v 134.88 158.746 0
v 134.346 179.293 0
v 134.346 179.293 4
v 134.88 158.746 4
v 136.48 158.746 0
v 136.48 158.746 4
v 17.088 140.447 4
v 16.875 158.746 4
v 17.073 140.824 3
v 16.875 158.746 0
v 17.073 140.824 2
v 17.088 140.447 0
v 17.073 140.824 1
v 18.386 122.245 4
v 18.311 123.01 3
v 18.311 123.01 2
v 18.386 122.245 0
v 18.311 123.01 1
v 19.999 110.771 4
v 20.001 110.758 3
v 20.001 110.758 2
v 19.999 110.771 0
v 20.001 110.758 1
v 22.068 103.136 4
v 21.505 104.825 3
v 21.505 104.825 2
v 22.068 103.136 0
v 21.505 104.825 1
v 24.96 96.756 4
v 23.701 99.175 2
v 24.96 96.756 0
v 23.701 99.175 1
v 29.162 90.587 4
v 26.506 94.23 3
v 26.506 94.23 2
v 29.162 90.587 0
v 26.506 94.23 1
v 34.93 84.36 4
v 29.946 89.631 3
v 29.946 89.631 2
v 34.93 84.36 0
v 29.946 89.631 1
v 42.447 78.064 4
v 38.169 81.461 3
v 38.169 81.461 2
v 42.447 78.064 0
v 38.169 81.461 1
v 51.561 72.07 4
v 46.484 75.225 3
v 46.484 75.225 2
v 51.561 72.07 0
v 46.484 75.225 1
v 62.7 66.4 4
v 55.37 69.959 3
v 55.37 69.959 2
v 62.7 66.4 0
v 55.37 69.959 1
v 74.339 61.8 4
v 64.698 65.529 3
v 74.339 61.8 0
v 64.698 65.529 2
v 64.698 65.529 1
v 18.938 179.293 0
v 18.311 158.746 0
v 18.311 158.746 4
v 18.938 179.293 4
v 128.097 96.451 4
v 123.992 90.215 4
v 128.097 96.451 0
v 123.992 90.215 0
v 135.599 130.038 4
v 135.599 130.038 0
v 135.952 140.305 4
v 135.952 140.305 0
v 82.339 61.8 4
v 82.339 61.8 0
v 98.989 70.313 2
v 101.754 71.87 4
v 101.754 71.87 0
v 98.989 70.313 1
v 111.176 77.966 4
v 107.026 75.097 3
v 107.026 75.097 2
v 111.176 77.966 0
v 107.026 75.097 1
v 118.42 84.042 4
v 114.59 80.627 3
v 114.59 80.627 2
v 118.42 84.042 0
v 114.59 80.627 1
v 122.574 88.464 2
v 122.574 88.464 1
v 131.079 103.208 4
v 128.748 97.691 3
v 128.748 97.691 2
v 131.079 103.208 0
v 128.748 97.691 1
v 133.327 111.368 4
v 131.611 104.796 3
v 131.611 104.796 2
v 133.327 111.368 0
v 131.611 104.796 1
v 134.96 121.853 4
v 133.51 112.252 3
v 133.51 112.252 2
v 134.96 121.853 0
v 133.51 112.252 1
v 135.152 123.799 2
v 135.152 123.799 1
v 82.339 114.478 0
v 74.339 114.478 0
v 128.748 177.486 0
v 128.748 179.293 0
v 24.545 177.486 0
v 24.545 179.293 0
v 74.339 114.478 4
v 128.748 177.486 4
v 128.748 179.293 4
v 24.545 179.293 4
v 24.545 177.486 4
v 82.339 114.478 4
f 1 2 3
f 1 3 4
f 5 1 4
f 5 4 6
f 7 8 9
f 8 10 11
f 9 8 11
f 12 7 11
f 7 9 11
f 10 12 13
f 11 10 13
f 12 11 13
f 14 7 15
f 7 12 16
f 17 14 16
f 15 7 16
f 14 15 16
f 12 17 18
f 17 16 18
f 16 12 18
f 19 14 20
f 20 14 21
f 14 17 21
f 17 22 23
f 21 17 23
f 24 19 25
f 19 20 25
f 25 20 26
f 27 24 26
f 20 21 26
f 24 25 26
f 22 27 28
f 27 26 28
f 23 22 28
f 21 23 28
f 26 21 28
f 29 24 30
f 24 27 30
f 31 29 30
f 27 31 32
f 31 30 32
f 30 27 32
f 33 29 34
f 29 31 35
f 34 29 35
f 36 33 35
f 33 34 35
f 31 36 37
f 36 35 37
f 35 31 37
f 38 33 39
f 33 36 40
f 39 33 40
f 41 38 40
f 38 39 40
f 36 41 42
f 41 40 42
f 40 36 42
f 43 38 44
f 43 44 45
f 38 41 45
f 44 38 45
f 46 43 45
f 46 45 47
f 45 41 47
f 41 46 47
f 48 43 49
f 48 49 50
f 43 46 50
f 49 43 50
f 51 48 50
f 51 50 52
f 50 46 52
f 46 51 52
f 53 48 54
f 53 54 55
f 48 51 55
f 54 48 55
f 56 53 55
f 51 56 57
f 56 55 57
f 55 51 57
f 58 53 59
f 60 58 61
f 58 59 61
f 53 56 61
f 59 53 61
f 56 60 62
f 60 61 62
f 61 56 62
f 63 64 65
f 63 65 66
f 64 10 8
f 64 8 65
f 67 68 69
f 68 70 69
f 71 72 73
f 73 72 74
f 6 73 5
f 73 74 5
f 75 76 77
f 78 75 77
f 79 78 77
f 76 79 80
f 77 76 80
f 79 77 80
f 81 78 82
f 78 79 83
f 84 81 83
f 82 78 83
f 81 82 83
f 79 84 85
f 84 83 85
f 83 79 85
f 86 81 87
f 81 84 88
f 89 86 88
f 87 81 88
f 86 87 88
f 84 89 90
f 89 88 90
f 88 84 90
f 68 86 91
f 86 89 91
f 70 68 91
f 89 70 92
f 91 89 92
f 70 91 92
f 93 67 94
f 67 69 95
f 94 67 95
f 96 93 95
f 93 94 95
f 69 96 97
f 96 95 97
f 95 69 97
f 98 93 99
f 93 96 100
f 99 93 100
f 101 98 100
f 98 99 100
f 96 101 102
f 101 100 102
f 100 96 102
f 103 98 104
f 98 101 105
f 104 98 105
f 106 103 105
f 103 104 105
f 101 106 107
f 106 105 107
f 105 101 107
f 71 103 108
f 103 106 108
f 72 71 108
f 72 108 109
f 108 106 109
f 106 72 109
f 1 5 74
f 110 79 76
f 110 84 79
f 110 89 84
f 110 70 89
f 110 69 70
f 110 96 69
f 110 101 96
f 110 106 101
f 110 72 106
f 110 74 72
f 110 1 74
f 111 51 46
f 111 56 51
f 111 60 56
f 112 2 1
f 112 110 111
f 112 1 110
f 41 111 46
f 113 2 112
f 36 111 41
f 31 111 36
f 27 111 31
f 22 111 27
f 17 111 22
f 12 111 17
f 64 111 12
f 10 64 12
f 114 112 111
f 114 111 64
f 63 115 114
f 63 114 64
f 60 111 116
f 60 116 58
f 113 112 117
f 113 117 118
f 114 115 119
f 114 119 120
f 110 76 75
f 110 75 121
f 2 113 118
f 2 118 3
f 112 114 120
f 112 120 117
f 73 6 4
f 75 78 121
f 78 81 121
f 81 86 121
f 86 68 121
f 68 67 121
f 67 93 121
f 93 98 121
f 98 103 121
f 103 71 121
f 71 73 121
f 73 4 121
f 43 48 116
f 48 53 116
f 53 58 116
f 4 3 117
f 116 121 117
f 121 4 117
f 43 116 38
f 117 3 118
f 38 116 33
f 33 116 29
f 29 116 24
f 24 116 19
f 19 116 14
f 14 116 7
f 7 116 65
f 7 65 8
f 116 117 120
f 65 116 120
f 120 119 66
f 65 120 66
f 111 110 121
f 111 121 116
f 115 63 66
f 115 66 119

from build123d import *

# Parameters (mm, degrees)
EXTRUDE_1_DEPTH = 4


with BuildPart() as part:
    # 草图1 → 凸台-拉伸1 (new body)
    with BuildSketch(Plane.XY):
        with BuildLine():
            Line((24.544959995, 177.485969069), (128.748328158, 177.485969069))
            Line((128.748328158, 177.485969069), (128.748328158, 179.293294419))
            Line((128.748328158, 179.293294419), (134.346034298, 179.293294419))
            Line((134.346034298, 179.293294419), (134.879857933, 158.745986921))
            Line((134.879857933, 158.745986921), (136.480161375, 158.745986921))
            add(Edge.make_bspline(
                [(82.339222624, 61.799570381), (93.413791621, 67.40108472), (111.733151171, 75.721290264), (128.944446456, 95.047085793), (136.913830684, 122.368393715), (135.612959328, 143.308632698), (136.480161375, 158.745986921)],
                knots=[0, 0, 0, 0, 0.307761121, 0.49025, 0.616329843, 1, 1, 1, 1], degree=3))
            Line((82.339222624, 61.799570381), (82.339222624, 114.477905509))
            Line((82.339222624, 114.477905509), (74.339356348, 114.477905509))
            Line((74.339356348, 114.477905509), (74.339356348, 61.799570381))
            add(Edge.make_bspline(
                [(16.87547225, 158.745986921), (16.656848614, 146.616830277), (17.473837396, 127.05807142), (21.26977179, 98.647925224), (41.890975618, 75.802317121), (61.331956485, 66.364243686), (74.339356348, 61.799570381)],
                knots=[0, 0, 0, 0, 0.287578734, 0.483998215, 0.66783425, 1, 1, 1, 1], degree=3))
            Line((16.87547225, 158.745986921), (18.310507908, 158.745986921))
            Line((18.310507908, 158.745986921), (18.938336008, 179.293294419))
            Line((18.938336008, 179.293294419), (24.544959995, 179.293294419))
            Line((24.544959995, 179.293294419), (24.544959995, 177.485969069))
        make_face()
    extrude(amount=EXTRUDE_1_DEPTH)


solid = part.part
